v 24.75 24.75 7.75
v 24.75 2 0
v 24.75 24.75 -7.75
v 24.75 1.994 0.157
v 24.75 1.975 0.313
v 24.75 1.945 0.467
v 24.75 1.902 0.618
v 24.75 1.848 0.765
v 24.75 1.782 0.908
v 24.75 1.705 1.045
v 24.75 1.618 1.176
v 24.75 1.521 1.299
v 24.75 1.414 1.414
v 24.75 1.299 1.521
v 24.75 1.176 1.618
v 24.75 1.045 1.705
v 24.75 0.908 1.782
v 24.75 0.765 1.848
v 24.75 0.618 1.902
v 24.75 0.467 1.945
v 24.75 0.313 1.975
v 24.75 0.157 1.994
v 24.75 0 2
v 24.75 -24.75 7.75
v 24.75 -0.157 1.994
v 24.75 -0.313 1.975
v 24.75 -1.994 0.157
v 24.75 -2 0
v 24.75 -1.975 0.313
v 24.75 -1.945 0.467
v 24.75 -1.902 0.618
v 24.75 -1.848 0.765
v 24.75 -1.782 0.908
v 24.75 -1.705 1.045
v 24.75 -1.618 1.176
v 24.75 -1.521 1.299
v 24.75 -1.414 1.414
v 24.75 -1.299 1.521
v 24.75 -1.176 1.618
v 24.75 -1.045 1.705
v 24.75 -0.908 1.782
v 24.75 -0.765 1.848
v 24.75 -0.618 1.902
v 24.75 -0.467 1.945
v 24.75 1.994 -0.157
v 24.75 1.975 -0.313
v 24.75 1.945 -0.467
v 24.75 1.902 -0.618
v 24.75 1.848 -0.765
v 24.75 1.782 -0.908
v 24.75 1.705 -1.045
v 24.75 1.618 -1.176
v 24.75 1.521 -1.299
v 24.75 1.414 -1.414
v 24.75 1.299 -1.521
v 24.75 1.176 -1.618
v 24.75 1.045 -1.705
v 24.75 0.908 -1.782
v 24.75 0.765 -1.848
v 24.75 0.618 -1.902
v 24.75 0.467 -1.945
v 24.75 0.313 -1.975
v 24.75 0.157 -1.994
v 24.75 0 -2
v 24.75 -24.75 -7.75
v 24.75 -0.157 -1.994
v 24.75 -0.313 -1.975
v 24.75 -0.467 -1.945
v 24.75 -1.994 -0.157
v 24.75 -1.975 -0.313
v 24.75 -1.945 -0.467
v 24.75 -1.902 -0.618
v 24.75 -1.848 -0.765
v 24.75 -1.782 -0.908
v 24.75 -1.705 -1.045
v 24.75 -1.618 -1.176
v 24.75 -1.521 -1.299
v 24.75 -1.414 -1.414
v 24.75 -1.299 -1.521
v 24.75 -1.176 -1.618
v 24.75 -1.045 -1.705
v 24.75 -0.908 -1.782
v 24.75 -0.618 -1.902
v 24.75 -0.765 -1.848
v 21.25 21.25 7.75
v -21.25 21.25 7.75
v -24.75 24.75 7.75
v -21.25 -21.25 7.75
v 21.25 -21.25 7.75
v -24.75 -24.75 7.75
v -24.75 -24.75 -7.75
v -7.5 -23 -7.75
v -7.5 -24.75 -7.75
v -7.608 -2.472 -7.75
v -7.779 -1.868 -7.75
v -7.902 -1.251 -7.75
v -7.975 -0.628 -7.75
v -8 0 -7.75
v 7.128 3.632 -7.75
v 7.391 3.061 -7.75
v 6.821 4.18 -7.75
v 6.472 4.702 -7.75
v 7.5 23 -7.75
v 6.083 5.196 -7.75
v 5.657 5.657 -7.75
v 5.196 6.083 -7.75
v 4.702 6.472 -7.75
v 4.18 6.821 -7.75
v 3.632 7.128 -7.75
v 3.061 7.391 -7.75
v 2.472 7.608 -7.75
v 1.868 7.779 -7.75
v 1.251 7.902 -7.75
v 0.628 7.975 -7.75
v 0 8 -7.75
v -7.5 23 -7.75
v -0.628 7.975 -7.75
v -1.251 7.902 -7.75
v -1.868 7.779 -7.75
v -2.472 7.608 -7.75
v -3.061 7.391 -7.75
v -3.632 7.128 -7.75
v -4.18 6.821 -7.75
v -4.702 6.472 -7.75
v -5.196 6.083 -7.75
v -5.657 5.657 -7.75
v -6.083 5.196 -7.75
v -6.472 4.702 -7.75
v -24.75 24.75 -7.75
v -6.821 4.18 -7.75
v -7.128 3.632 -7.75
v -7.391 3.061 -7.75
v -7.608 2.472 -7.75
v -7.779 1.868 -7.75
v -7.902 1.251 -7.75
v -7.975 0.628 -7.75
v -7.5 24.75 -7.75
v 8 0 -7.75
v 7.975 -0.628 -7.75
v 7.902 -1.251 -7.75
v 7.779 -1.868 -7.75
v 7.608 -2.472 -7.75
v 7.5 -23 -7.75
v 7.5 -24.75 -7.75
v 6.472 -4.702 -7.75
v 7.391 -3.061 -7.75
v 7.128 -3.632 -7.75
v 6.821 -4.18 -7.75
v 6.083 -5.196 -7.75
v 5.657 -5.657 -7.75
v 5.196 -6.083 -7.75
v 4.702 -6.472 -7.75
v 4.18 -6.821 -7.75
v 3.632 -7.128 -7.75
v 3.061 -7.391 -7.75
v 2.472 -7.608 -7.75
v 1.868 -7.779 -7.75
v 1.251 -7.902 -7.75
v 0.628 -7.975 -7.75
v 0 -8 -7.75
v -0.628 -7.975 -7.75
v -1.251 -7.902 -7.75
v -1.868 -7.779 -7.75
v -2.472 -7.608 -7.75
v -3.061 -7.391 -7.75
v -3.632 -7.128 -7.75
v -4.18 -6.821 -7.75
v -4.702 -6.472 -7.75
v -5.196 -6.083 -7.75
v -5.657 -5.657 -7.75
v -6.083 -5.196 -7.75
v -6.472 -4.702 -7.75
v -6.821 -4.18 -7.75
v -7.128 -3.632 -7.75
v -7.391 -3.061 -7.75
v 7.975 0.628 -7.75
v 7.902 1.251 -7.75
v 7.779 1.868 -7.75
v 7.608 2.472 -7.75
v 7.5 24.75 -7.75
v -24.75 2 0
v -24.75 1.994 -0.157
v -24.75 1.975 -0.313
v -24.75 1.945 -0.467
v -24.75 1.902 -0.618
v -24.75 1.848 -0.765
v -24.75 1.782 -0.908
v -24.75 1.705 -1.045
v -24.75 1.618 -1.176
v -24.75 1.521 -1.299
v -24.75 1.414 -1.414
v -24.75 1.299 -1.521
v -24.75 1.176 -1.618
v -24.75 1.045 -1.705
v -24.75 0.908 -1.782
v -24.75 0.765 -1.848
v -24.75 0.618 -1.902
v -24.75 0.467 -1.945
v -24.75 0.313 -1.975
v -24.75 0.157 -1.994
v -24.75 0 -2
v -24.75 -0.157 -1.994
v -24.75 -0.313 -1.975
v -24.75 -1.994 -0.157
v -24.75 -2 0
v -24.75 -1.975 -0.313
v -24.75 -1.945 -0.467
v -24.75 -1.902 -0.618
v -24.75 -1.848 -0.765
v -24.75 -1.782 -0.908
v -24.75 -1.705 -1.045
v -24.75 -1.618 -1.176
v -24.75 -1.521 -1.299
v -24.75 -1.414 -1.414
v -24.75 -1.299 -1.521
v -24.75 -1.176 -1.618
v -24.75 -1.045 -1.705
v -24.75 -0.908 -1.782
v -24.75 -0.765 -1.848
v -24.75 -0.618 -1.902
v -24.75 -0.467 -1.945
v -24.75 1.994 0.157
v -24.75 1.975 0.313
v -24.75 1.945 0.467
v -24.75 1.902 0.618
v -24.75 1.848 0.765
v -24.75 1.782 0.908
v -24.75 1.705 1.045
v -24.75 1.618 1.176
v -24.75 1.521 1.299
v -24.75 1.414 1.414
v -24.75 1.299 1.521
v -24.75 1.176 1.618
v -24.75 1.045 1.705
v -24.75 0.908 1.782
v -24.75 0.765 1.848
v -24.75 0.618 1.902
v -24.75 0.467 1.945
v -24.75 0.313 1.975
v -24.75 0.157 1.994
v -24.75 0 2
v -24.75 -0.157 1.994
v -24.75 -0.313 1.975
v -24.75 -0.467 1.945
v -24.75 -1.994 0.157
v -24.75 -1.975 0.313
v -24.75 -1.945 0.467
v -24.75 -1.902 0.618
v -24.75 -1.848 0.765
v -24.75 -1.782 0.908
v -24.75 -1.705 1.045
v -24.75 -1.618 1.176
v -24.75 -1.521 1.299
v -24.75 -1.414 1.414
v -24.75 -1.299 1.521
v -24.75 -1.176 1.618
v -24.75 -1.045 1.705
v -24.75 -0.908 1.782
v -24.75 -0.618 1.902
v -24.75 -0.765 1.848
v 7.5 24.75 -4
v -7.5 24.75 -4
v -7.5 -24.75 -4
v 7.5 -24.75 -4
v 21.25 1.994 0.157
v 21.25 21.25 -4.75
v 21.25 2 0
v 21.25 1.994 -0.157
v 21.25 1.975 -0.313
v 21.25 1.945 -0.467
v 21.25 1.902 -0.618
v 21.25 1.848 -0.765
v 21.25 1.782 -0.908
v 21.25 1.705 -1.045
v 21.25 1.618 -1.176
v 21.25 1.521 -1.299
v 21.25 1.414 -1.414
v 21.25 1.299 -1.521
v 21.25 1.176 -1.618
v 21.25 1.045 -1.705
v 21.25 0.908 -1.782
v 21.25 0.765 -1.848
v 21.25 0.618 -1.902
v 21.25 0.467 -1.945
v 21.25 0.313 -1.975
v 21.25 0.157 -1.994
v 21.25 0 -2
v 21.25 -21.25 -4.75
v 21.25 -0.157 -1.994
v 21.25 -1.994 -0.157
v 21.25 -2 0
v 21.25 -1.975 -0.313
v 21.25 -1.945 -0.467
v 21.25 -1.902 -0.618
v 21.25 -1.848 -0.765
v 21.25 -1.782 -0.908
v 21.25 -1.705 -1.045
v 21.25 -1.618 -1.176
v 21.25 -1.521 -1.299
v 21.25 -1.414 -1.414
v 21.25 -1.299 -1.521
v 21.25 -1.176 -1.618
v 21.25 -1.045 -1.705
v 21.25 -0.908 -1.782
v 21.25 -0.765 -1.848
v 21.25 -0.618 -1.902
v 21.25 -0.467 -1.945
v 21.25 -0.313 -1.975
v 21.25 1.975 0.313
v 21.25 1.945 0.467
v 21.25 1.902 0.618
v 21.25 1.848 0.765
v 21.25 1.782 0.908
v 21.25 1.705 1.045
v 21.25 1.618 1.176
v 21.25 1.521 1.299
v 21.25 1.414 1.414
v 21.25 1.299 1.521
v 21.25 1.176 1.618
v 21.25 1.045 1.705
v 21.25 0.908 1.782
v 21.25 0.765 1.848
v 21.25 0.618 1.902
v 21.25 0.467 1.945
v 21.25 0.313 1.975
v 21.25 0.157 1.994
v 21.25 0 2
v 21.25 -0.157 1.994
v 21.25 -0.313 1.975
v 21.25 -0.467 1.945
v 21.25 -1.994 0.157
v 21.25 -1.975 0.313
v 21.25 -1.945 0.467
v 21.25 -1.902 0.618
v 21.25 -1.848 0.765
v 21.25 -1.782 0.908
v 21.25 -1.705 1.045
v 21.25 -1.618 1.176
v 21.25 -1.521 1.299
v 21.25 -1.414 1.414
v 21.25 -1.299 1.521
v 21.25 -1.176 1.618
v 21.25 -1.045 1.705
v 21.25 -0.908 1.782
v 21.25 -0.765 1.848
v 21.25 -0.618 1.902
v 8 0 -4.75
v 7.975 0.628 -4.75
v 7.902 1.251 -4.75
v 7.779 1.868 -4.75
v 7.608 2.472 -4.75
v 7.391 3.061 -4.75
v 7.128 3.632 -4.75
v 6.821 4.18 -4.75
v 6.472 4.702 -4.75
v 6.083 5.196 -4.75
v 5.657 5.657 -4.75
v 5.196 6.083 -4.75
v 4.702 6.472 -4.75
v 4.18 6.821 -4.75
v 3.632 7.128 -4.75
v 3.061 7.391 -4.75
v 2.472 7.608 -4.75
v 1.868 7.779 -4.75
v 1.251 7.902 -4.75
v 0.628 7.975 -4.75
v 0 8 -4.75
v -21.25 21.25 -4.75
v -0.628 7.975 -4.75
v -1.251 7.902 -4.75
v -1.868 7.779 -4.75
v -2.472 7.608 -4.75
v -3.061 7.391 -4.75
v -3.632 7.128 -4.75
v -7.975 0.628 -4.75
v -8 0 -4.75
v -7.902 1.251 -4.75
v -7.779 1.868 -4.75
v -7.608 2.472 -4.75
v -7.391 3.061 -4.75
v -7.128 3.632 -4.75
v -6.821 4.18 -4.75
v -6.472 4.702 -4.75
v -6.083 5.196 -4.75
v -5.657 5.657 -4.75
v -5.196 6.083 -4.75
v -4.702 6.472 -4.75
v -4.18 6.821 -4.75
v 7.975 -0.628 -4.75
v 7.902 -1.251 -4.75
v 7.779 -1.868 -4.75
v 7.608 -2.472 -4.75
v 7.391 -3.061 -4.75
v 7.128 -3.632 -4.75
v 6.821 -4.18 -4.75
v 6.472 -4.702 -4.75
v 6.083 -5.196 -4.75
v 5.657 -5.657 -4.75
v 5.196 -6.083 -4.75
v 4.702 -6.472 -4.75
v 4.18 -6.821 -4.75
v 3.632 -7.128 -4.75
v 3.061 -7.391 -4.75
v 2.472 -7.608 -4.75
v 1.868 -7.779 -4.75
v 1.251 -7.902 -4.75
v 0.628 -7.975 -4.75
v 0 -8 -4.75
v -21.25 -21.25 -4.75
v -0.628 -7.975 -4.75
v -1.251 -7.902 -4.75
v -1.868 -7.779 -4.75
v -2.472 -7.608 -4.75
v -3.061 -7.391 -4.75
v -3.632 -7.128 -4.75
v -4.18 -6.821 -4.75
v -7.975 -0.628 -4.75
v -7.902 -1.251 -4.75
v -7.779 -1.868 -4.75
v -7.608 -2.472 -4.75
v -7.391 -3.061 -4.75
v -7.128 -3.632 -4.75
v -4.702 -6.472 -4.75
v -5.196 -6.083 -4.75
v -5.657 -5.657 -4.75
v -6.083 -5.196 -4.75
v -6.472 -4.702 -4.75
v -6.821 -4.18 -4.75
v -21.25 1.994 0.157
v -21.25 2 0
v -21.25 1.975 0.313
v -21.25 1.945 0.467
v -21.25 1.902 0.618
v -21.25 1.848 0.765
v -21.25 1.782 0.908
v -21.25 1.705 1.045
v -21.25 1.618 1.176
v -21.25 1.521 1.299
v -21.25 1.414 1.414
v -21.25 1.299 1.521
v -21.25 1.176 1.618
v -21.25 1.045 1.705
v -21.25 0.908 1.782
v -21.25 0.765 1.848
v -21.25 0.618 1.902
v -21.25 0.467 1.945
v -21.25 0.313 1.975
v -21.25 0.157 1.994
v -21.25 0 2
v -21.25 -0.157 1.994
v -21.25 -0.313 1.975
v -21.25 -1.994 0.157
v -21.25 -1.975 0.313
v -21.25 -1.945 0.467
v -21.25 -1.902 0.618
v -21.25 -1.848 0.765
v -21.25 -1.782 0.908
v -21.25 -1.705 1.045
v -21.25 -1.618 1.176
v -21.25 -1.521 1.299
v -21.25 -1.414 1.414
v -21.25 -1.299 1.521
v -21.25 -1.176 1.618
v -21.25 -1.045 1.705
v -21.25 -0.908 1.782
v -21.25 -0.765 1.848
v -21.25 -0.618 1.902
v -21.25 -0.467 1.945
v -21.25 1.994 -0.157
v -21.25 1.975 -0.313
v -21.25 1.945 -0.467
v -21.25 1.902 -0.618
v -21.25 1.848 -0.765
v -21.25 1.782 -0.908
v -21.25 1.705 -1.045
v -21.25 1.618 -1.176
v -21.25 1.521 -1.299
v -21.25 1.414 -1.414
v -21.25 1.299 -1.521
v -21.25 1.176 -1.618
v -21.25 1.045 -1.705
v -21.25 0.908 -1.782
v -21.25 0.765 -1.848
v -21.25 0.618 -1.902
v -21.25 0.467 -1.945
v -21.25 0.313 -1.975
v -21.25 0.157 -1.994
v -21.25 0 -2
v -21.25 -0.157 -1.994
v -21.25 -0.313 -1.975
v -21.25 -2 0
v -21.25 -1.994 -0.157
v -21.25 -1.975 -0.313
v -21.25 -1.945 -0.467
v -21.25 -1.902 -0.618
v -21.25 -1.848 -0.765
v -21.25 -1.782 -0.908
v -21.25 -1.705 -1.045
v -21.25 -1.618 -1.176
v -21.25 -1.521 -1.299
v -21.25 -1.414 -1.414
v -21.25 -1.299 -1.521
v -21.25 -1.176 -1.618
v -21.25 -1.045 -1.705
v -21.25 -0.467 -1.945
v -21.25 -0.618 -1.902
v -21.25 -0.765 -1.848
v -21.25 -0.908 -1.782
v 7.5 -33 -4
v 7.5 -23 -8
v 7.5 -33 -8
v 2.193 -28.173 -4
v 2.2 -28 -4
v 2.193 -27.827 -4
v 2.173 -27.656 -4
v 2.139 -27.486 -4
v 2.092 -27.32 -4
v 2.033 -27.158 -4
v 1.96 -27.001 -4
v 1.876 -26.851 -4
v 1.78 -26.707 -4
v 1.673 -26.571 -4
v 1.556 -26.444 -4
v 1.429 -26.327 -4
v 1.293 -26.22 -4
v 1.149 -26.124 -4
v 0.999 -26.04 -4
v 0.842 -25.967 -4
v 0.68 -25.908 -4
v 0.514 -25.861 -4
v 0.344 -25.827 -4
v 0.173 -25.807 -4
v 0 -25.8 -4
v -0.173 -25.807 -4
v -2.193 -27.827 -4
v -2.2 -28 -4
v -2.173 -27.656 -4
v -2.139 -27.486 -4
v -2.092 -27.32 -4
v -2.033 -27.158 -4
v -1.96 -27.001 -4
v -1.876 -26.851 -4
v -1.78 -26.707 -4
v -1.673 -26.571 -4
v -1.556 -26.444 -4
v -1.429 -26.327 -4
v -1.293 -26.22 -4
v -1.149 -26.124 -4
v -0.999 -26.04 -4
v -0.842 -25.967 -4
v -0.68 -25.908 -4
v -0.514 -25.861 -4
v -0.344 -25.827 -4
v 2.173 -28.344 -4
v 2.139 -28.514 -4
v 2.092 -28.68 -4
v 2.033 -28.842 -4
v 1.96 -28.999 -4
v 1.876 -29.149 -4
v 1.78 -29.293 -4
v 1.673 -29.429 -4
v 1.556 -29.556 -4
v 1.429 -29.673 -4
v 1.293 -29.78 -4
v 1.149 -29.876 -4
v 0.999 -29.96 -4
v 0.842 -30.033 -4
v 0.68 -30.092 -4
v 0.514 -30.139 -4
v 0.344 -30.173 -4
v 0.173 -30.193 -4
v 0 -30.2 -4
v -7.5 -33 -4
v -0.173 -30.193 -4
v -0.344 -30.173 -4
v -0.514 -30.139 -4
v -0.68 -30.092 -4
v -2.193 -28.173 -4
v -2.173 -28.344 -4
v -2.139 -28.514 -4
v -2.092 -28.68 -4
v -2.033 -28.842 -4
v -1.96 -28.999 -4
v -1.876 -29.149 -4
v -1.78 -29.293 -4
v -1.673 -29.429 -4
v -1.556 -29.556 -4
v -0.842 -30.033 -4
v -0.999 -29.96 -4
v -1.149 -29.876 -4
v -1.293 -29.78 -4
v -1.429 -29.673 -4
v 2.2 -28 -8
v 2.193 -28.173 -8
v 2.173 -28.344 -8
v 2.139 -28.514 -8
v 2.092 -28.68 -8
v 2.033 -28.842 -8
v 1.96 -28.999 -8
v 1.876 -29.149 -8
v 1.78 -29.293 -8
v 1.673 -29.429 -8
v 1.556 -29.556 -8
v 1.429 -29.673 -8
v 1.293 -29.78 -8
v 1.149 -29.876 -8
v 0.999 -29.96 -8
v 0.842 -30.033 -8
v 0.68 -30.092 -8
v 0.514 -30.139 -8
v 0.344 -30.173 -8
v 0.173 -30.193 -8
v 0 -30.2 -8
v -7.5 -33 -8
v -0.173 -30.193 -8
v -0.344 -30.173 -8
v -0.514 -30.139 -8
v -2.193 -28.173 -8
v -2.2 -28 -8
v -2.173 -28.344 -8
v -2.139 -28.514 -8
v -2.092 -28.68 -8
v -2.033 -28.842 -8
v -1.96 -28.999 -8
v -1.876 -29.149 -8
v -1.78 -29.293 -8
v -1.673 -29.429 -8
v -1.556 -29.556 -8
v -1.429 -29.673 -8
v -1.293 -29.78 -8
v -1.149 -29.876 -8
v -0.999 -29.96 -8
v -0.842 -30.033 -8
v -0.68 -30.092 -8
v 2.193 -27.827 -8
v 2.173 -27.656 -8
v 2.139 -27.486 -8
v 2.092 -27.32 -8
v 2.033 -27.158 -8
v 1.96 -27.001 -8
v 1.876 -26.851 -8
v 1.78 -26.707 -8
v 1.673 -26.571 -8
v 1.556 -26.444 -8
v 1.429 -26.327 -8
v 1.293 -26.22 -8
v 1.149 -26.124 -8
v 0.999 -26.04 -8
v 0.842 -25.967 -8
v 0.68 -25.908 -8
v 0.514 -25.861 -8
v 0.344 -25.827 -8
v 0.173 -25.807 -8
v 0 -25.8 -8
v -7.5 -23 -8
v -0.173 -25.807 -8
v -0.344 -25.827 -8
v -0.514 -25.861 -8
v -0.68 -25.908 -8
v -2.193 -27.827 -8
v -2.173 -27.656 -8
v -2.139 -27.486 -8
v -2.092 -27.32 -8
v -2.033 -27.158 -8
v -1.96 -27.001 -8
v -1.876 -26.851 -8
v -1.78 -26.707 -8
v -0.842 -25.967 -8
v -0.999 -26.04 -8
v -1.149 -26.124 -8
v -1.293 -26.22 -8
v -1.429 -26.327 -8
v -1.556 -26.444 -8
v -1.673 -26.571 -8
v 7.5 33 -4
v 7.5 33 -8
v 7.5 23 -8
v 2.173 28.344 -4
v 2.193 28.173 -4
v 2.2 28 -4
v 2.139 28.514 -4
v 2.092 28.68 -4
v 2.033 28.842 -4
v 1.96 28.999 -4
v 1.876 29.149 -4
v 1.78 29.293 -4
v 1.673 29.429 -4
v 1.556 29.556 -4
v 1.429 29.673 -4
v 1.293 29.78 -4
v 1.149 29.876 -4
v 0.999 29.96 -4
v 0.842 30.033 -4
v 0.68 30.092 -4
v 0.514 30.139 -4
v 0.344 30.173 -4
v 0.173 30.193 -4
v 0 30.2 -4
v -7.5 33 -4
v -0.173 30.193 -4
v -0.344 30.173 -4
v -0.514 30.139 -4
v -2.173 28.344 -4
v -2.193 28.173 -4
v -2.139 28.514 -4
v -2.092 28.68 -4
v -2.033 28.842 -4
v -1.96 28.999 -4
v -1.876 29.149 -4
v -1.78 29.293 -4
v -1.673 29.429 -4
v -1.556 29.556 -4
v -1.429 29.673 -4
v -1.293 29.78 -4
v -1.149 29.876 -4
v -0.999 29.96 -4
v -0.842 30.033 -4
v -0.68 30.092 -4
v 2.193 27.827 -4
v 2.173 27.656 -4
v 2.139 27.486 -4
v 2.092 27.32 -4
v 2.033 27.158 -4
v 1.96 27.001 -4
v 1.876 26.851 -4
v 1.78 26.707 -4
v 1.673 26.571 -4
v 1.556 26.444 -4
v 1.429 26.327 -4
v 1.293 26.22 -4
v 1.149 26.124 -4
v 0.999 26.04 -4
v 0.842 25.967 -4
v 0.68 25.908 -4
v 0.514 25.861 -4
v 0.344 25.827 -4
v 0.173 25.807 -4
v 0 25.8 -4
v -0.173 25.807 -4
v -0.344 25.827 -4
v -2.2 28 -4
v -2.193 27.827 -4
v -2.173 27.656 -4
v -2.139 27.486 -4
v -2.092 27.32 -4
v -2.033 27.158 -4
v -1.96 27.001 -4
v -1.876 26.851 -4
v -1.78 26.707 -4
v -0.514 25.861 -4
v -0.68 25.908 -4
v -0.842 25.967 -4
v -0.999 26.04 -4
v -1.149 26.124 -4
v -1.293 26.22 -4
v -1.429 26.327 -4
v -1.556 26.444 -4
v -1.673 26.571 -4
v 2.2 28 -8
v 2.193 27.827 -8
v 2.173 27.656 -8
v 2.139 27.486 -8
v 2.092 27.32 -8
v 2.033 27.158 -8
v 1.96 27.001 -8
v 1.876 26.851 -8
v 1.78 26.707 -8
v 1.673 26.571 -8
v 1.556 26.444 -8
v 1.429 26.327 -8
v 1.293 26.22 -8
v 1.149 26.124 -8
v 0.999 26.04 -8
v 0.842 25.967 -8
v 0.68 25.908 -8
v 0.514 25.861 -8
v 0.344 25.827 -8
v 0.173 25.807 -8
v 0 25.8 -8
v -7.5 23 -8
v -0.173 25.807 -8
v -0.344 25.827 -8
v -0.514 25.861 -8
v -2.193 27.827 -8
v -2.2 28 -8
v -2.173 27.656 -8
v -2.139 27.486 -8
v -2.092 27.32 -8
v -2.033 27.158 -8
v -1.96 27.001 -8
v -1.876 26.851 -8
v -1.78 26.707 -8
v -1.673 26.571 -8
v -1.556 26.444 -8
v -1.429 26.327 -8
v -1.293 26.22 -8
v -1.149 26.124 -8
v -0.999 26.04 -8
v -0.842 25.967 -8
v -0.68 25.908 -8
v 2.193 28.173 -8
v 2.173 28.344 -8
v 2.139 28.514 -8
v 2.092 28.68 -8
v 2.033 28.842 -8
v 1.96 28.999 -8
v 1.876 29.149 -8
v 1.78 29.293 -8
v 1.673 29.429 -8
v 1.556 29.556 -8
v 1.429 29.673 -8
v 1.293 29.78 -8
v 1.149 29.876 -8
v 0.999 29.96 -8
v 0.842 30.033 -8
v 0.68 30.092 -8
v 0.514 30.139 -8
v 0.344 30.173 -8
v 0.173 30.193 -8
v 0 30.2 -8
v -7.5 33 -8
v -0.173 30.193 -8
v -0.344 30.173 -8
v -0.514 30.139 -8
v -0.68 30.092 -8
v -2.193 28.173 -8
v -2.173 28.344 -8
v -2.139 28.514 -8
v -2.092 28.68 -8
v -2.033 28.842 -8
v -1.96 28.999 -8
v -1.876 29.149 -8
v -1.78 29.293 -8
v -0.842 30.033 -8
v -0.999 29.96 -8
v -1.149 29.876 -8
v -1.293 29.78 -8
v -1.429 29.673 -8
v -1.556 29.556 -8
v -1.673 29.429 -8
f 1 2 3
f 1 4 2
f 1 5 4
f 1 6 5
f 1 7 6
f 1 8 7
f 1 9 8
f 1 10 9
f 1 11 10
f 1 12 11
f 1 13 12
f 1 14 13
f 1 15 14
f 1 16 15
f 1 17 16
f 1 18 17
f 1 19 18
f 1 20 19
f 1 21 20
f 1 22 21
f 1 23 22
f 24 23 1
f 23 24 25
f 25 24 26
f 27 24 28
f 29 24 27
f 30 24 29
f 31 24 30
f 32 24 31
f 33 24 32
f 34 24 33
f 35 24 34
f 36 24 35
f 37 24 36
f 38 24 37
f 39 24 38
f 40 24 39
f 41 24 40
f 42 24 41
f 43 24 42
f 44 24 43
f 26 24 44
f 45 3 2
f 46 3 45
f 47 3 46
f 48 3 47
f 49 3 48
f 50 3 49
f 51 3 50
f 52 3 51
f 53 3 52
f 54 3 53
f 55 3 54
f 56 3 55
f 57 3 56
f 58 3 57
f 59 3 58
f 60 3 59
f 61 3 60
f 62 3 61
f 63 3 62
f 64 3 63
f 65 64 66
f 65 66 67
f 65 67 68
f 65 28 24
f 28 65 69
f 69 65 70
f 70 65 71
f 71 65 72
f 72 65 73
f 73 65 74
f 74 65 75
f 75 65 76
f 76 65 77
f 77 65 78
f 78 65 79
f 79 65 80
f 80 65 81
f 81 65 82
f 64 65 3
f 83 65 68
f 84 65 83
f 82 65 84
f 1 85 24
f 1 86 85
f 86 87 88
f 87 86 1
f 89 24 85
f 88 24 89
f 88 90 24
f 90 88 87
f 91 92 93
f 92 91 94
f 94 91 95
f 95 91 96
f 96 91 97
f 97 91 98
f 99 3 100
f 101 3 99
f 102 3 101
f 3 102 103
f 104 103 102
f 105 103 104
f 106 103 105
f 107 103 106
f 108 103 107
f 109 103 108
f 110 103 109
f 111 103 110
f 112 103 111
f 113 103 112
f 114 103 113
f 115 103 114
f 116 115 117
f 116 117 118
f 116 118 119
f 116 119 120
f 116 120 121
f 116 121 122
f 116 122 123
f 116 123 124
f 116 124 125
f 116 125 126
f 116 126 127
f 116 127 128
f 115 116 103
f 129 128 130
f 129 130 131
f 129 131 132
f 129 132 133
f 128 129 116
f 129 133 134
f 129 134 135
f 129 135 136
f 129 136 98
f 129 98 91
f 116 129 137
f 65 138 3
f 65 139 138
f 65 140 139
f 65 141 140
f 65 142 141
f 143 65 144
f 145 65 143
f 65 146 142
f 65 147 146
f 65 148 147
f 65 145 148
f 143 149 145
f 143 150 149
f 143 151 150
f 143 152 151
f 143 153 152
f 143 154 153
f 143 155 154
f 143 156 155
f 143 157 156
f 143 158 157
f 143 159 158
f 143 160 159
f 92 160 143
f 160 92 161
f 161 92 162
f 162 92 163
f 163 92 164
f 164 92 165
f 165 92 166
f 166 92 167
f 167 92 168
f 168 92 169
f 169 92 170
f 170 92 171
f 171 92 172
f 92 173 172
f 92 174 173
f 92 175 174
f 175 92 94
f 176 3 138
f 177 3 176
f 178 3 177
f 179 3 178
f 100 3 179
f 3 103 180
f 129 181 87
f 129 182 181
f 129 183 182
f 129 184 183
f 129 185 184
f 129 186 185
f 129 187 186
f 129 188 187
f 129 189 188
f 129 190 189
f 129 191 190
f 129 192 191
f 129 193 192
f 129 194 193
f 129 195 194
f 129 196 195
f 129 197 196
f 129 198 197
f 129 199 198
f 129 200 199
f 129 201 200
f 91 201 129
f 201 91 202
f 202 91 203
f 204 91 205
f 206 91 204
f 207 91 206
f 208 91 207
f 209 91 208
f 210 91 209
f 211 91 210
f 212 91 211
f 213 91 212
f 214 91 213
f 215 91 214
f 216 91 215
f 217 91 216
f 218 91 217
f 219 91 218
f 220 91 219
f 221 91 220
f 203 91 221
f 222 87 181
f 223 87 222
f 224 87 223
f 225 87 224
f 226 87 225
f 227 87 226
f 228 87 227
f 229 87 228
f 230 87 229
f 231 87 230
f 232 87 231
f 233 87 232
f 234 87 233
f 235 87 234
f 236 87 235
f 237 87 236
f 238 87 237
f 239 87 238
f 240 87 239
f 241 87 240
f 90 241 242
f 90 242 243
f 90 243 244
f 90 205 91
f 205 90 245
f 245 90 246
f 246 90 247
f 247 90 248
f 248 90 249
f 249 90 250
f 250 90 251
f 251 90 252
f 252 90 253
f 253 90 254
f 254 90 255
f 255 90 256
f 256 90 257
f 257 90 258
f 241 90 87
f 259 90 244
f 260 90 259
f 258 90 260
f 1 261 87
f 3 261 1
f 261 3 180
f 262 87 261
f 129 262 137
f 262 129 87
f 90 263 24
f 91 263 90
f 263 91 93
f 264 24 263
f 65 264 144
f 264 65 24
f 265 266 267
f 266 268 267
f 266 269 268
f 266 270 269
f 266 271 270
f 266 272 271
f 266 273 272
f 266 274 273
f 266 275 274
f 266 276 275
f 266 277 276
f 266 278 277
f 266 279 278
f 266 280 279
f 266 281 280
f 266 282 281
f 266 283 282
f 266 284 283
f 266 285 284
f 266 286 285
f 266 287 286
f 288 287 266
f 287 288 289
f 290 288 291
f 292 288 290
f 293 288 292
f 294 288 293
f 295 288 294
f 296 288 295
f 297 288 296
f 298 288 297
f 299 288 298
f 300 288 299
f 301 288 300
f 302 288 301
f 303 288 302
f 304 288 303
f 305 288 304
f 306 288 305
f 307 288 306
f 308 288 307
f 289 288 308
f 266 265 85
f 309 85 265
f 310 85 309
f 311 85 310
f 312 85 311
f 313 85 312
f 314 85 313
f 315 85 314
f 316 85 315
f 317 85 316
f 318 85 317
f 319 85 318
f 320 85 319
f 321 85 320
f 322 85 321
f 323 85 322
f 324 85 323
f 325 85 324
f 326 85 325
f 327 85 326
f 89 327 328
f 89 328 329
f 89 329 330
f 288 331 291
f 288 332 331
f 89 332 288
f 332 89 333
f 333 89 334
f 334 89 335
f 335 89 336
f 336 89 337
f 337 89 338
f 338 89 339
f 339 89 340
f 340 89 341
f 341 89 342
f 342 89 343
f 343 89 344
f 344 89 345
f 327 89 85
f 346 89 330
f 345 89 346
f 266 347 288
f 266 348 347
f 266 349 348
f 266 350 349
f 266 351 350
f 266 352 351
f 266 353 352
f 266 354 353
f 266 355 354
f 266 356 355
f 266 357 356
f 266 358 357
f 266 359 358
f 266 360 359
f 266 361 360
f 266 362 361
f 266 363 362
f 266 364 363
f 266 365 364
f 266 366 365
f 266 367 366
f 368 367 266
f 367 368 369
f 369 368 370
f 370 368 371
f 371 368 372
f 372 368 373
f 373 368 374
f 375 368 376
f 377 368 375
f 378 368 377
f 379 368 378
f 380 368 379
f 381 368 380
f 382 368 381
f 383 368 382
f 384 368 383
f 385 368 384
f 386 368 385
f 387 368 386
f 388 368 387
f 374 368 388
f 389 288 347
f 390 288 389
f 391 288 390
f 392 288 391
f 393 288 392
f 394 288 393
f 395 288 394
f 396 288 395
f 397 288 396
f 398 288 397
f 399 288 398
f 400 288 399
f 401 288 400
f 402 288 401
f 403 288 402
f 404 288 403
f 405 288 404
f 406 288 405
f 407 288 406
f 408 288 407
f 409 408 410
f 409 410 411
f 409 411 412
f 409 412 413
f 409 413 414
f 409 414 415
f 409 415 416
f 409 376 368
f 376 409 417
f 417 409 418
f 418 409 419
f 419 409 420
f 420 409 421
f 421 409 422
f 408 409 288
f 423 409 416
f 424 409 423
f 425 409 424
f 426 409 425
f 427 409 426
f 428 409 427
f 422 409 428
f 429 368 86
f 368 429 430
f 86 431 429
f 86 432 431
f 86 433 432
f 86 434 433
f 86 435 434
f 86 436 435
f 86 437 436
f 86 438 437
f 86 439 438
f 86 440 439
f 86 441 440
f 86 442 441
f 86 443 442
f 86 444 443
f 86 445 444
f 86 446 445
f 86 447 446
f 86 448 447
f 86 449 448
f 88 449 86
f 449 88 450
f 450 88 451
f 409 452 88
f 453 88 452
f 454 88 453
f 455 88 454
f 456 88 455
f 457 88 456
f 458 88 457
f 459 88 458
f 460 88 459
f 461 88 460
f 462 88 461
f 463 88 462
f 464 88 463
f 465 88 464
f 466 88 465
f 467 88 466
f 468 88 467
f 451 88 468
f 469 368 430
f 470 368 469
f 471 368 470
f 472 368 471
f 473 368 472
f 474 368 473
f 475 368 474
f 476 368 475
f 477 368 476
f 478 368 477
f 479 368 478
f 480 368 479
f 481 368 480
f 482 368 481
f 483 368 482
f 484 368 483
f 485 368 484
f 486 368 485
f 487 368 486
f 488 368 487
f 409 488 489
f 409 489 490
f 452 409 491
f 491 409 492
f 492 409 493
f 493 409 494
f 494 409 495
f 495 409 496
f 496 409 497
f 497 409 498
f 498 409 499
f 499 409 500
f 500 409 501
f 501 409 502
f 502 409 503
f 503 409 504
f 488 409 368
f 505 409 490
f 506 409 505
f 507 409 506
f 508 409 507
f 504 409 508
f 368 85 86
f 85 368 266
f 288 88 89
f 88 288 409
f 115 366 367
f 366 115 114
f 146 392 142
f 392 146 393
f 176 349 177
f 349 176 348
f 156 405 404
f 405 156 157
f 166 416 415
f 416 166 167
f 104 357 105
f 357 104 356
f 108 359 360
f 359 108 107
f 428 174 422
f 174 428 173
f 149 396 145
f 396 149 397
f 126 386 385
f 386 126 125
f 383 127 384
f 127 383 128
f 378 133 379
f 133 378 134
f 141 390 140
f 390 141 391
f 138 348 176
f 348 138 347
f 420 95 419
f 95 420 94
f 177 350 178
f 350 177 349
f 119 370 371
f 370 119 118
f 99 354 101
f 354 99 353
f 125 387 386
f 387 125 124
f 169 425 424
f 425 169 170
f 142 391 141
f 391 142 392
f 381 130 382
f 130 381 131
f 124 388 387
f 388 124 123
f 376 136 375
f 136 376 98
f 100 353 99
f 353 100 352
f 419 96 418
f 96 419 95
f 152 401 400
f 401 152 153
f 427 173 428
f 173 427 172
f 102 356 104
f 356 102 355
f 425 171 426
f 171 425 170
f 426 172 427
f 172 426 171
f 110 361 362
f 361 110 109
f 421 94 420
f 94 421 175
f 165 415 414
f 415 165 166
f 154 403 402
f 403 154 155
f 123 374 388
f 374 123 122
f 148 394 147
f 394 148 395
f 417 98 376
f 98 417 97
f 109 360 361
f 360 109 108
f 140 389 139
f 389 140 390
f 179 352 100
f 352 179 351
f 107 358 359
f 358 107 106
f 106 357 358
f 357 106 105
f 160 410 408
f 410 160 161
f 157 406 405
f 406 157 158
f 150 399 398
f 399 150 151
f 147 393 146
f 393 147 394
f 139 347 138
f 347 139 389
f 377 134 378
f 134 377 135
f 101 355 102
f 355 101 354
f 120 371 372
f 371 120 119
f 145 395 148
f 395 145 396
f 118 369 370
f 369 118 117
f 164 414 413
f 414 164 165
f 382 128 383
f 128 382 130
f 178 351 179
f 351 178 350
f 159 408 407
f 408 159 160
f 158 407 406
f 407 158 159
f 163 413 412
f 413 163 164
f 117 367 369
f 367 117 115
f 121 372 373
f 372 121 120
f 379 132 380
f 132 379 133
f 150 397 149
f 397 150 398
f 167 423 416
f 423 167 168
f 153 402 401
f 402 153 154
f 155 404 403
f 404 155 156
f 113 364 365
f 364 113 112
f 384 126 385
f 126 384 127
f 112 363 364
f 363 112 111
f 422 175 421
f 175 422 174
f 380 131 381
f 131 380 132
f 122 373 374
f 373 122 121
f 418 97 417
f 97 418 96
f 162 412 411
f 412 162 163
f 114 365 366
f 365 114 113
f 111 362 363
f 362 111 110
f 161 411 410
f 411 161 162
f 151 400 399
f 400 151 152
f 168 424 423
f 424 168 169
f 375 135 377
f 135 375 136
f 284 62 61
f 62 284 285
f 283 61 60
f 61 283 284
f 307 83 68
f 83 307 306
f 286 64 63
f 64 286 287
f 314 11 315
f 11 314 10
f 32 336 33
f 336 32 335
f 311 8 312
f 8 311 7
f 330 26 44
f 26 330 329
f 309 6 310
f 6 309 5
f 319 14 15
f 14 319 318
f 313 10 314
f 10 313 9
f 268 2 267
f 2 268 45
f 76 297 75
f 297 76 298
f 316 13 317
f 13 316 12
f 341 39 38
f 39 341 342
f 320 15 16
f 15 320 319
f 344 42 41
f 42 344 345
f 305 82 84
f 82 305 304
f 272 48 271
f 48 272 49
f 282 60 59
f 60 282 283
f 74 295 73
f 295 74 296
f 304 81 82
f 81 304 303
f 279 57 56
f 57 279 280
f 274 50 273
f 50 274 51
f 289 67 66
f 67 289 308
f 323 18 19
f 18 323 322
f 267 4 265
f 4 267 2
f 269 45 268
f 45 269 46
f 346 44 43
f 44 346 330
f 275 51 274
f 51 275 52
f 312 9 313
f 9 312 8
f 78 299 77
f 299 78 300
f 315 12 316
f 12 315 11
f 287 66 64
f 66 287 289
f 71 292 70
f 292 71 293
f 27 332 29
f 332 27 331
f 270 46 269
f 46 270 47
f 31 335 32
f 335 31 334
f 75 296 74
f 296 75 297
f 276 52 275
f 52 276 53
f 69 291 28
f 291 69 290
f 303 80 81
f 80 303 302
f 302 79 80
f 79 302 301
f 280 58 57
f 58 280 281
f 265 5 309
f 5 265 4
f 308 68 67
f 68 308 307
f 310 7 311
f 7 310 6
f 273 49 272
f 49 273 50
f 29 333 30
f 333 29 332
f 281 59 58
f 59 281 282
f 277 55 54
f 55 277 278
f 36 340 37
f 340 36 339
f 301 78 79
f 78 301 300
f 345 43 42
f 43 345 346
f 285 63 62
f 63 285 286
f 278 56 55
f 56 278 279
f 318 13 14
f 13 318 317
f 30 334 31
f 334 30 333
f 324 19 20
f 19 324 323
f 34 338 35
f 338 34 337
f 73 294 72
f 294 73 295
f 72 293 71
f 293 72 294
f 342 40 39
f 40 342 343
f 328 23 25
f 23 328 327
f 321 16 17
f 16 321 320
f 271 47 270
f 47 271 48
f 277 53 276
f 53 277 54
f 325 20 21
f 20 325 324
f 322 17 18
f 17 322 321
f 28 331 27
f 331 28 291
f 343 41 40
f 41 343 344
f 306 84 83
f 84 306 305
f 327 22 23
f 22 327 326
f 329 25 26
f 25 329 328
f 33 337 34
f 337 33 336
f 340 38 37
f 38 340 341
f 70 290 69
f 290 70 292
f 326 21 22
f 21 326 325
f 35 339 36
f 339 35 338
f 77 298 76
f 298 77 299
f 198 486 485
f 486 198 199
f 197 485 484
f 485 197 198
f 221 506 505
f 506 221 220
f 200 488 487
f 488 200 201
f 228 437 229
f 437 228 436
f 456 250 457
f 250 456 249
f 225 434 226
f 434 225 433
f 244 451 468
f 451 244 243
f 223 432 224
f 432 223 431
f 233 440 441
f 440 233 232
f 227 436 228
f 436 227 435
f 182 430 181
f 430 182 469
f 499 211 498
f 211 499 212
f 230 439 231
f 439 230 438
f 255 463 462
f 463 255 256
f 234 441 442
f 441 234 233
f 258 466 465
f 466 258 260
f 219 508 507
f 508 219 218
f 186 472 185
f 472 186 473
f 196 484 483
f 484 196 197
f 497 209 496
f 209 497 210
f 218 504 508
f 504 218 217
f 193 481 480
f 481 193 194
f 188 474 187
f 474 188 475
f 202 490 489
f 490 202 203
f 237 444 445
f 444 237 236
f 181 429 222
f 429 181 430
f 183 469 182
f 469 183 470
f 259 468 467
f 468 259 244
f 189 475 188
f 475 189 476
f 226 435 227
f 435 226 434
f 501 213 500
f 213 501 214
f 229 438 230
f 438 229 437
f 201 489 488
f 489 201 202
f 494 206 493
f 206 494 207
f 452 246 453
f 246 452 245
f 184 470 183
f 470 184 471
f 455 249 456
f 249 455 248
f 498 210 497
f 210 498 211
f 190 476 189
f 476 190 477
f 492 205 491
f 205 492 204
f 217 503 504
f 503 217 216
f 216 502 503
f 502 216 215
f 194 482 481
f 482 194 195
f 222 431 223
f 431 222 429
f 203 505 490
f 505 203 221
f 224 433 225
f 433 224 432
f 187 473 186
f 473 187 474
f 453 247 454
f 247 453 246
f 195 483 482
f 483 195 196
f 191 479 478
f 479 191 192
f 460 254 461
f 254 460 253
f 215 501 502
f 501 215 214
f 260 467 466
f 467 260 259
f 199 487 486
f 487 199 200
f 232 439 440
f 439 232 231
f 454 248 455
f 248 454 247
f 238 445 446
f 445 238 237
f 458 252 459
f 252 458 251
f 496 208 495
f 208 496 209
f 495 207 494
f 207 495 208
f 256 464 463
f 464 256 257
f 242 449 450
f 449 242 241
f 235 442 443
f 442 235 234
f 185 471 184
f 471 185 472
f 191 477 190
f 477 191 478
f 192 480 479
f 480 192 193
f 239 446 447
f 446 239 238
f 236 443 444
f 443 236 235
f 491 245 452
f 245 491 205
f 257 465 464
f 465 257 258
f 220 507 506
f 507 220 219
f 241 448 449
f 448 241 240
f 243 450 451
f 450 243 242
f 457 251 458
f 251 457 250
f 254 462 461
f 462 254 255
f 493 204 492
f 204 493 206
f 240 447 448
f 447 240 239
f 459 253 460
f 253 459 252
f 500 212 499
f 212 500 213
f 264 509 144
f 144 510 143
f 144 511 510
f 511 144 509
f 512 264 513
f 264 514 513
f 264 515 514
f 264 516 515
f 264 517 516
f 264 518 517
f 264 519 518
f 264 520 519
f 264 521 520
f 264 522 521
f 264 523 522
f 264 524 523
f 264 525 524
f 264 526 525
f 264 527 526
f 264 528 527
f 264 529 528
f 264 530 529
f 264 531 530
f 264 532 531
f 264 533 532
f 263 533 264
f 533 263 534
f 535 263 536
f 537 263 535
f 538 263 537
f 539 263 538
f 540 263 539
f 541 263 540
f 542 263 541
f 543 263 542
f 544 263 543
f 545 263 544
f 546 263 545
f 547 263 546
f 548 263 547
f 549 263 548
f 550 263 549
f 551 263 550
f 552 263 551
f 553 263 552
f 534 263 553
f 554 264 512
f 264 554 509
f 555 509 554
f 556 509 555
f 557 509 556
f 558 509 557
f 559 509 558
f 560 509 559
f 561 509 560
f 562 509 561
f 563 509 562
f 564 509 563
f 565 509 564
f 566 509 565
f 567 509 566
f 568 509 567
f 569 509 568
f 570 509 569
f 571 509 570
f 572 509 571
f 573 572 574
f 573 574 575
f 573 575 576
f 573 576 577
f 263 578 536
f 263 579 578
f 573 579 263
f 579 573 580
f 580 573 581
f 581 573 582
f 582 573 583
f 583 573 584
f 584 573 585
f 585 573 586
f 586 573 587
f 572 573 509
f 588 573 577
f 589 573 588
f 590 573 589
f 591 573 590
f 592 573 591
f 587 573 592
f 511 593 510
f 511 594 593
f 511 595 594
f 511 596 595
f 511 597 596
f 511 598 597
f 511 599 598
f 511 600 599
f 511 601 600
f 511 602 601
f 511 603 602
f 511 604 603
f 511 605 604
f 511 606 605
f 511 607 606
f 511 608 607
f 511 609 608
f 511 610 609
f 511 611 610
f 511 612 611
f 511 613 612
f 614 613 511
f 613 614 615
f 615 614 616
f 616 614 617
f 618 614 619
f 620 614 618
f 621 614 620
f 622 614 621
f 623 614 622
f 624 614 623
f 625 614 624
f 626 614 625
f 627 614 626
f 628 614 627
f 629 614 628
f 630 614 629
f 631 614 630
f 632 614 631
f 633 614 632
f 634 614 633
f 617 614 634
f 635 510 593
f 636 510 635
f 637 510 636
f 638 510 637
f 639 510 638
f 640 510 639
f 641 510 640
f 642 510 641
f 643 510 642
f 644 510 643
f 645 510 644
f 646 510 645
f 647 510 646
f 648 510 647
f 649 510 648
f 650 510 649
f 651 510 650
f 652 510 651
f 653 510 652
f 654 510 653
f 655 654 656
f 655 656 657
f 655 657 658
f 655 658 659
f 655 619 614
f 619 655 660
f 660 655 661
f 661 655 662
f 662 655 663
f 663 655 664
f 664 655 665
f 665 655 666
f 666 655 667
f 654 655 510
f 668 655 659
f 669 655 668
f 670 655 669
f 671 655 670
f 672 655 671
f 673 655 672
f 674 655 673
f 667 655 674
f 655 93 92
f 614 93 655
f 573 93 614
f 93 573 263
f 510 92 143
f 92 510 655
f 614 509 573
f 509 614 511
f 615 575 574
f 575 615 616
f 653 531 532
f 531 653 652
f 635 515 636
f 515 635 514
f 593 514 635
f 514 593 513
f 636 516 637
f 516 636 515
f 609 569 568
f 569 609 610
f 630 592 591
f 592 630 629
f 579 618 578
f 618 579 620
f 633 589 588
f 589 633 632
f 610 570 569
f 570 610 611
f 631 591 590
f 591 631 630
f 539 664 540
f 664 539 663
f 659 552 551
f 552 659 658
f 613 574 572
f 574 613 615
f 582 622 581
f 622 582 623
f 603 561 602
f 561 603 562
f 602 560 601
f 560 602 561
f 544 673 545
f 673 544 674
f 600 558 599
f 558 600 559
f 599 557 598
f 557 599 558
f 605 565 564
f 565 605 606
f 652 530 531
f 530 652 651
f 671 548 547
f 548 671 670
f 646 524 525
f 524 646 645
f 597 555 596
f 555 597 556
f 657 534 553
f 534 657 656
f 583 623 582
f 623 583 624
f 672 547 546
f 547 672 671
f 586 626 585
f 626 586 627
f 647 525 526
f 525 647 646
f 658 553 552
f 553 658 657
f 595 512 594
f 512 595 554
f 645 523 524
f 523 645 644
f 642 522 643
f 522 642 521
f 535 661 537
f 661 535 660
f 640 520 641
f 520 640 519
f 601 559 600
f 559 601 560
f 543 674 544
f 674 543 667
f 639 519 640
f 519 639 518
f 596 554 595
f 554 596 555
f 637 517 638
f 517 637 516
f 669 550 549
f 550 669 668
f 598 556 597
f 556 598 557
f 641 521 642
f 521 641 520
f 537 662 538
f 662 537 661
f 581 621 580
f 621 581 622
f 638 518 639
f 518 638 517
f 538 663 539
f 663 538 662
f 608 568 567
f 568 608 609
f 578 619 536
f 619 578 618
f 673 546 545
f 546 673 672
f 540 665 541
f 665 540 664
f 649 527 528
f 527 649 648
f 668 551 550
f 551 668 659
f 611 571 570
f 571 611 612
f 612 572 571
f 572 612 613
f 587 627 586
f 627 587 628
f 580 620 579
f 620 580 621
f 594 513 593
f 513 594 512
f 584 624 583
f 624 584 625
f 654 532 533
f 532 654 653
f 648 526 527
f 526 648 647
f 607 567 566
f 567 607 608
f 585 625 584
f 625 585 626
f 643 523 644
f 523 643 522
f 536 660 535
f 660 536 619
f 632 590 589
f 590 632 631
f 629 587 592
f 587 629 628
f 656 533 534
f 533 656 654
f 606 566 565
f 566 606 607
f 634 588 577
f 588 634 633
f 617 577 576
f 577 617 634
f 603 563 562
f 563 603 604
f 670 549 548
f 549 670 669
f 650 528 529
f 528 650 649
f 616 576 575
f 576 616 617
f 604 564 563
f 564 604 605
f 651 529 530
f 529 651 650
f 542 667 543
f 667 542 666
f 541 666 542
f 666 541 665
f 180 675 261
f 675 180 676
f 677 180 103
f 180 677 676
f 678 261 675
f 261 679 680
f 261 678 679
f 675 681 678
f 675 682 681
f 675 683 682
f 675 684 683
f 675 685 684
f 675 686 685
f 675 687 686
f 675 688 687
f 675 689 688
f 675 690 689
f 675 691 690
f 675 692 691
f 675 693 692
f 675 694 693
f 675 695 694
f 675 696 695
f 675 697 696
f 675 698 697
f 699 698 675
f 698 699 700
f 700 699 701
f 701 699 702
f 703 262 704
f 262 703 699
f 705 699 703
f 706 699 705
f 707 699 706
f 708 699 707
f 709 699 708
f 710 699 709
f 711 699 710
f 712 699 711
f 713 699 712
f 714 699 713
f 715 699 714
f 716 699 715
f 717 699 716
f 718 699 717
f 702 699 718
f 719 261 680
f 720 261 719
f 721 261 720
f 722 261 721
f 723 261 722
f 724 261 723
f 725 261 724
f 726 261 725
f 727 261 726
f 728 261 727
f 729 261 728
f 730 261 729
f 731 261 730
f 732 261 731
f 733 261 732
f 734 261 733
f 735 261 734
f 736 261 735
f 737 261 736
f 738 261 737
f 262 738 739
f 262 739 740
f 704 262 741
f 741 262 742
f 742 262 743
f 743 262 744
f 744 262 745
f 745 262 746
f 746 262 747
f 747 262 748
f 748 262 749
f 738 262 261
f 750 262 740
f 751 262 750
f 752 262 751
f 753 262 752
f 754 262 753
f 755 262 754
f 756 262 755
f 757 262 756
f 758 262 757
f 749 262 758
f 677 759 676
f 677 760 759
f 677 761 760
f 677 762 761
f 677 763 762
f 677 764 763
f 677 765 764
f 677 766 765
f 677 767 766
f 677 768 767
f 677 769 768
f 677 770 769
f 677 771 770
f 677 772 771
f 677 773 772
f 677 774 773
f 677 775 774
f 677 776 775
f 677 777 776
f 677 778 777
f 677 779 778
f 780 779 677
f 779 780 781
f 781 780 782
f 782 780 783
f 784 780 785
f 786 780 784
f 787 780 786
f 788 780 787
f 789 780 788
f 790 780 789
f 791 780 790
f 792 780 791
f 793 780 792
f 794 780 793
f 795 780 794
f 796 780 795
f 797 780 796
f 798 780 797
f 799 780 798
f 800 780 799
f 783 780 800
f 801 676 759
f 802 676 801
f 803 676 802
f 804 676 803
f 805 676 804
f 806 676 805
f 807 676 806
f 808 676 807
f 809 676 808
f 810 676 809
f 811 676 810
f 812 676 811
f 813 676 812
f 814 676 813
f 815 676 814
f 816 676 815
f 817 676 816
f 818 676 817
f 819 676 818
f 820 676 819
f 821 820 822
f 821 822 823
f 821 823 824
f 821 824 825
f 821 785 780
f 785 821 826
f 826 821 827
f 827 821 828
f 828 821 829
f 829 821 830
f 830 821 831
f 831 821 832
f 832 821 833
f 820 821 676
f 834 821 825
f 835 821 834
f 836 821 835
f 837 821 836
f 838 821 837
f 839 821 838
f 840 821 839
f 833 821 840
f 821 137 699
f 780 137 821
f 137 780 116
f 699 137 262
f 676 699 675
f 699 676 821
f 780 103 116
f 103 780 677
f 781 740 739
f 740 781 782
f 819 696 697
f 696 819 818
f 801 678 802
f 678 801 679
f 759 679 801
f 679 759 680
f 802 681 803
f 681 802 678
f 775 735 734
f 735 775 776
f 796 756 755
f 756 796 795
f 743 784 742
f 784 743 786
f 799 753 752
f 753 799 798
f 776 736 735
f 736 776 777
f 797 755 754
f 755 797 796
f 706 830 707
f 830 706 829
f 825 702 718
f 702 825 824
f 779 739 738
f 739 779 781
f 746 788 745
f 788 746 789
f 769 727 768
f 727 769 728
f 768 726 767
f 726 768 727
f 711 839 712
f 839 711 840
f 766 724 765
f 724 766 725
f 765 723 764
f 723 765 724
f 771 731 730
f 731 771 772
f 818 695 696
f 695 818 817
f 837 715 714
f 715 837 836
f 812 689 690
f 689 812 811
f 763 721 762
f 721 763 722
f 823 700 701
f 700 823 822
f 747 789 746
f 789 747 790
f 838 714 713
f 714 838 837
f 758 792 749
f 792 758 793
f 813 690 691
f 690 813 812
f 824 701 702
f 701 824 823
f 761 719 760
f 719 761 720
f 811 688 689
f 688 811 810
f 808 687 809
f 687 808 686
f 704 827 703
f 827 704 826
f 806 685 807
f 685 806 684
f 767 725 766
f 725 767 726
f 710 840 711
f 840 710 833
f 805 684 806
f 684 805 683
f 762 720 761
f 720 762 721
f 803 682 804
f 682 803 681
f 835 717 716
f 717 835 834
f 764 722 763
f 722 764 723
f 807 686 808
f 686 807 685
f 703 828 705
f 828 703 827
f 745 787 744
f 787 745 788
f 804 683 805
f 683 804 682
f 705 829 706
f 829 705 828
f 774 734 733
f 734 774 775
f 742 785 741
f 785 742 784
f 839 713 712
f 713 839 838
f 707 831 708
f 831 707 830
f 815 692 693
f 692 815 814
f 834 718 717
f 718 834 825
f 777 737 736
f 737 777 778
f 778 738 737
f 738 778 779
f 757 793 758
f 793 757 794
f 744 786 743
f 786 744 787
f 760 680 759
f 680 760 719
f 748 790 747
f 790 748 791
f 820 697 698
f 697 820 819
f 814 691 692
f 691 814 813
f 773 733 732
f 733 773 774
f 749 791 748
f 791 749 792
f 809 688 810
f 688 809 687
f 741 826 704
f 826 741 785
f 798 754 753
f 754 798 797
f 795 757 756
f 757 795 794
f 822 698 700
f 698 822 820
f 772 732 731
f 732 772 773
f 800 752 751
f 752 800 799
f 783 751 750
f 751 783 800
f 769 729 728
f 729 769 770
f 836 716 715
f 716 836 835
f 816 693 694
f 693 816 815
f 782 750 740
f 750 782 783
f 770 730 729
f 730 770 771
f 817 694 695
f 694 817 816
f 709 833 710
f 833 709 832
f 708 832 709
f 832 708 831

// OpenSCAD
// ====================================================================
// DESIGN STANDARDS: RT Optoelectronic Assembly
// Mounting Substructure and Shield Isolation for Visual Transceiver Array
// ====================================================================

$fn = 80;

// Mechanical Interface Tolerances
sensor_pocket_w = 42.5;
sensor_pocket_h = 42.5;
clearance_depth = 12.0;
shield_wall     = 3.5;

module optoelectronic_shield_chassis() {
    difference() {
        // Main Outer Shield Wall Enclosure (Faraday Attenuation Boundary)
        color("DimGray", 0.9)
            cube([sensor_pocket_w + (shield_wall * 2), 
                  sensor_pocket_h + (shield_wall * 2), 
                  clearance_depth + shield_wall], center = true);
        
        // Internal Pocket Array for Visual Transceiver Board Placement
        translate([0, 0, shield_wall / 2])
            cube([sensor_pocket_w, sensor_pocket_h, clearance_depth + 1], center = true);
            
        // Central Clear Opening for Fiber Optic Cable Bus Junction
        cylinder(h = clearance_depth + shield_wall + 5, r = 8.0, center = true);
        
        // Coaxial Grounding Pin Routing Ports (Left/Right Ports)
        translate([sensor_pocket_w / 2 + 1.5, 0, 0])
            rotate([0, 90, 0])
                cylinder(h = 10, r = 2.0, center = true);
                
        translate([-(sensor_pocket_w / 2 + 1.5), 0, 0])
            rotate([0, 90, 0])
                cylinder(h = 10, r = 2.0, center = true);
    }
}

module isolation_mounting_tabs() {
    // Structural structural ears to secure transceiver housing to mainframe mount
    for (offset_y = [-28, 28]) {
        translate([0, offset_y, -(clearance_depth / 2)]) {
            difference() {
                color("Silver", 1.0)
                    cube([15.0, 10.0, 4.0], center = true);
                // Alignment bolt hole path
                cylinder(h = 6.0, r = 2.2, center = true);
            }
        }
    }
}

// Final Hardware Assembly Merge
union() {
    optoelectronic_shield_chassis();
    isolation_mounting_tabs();
}
